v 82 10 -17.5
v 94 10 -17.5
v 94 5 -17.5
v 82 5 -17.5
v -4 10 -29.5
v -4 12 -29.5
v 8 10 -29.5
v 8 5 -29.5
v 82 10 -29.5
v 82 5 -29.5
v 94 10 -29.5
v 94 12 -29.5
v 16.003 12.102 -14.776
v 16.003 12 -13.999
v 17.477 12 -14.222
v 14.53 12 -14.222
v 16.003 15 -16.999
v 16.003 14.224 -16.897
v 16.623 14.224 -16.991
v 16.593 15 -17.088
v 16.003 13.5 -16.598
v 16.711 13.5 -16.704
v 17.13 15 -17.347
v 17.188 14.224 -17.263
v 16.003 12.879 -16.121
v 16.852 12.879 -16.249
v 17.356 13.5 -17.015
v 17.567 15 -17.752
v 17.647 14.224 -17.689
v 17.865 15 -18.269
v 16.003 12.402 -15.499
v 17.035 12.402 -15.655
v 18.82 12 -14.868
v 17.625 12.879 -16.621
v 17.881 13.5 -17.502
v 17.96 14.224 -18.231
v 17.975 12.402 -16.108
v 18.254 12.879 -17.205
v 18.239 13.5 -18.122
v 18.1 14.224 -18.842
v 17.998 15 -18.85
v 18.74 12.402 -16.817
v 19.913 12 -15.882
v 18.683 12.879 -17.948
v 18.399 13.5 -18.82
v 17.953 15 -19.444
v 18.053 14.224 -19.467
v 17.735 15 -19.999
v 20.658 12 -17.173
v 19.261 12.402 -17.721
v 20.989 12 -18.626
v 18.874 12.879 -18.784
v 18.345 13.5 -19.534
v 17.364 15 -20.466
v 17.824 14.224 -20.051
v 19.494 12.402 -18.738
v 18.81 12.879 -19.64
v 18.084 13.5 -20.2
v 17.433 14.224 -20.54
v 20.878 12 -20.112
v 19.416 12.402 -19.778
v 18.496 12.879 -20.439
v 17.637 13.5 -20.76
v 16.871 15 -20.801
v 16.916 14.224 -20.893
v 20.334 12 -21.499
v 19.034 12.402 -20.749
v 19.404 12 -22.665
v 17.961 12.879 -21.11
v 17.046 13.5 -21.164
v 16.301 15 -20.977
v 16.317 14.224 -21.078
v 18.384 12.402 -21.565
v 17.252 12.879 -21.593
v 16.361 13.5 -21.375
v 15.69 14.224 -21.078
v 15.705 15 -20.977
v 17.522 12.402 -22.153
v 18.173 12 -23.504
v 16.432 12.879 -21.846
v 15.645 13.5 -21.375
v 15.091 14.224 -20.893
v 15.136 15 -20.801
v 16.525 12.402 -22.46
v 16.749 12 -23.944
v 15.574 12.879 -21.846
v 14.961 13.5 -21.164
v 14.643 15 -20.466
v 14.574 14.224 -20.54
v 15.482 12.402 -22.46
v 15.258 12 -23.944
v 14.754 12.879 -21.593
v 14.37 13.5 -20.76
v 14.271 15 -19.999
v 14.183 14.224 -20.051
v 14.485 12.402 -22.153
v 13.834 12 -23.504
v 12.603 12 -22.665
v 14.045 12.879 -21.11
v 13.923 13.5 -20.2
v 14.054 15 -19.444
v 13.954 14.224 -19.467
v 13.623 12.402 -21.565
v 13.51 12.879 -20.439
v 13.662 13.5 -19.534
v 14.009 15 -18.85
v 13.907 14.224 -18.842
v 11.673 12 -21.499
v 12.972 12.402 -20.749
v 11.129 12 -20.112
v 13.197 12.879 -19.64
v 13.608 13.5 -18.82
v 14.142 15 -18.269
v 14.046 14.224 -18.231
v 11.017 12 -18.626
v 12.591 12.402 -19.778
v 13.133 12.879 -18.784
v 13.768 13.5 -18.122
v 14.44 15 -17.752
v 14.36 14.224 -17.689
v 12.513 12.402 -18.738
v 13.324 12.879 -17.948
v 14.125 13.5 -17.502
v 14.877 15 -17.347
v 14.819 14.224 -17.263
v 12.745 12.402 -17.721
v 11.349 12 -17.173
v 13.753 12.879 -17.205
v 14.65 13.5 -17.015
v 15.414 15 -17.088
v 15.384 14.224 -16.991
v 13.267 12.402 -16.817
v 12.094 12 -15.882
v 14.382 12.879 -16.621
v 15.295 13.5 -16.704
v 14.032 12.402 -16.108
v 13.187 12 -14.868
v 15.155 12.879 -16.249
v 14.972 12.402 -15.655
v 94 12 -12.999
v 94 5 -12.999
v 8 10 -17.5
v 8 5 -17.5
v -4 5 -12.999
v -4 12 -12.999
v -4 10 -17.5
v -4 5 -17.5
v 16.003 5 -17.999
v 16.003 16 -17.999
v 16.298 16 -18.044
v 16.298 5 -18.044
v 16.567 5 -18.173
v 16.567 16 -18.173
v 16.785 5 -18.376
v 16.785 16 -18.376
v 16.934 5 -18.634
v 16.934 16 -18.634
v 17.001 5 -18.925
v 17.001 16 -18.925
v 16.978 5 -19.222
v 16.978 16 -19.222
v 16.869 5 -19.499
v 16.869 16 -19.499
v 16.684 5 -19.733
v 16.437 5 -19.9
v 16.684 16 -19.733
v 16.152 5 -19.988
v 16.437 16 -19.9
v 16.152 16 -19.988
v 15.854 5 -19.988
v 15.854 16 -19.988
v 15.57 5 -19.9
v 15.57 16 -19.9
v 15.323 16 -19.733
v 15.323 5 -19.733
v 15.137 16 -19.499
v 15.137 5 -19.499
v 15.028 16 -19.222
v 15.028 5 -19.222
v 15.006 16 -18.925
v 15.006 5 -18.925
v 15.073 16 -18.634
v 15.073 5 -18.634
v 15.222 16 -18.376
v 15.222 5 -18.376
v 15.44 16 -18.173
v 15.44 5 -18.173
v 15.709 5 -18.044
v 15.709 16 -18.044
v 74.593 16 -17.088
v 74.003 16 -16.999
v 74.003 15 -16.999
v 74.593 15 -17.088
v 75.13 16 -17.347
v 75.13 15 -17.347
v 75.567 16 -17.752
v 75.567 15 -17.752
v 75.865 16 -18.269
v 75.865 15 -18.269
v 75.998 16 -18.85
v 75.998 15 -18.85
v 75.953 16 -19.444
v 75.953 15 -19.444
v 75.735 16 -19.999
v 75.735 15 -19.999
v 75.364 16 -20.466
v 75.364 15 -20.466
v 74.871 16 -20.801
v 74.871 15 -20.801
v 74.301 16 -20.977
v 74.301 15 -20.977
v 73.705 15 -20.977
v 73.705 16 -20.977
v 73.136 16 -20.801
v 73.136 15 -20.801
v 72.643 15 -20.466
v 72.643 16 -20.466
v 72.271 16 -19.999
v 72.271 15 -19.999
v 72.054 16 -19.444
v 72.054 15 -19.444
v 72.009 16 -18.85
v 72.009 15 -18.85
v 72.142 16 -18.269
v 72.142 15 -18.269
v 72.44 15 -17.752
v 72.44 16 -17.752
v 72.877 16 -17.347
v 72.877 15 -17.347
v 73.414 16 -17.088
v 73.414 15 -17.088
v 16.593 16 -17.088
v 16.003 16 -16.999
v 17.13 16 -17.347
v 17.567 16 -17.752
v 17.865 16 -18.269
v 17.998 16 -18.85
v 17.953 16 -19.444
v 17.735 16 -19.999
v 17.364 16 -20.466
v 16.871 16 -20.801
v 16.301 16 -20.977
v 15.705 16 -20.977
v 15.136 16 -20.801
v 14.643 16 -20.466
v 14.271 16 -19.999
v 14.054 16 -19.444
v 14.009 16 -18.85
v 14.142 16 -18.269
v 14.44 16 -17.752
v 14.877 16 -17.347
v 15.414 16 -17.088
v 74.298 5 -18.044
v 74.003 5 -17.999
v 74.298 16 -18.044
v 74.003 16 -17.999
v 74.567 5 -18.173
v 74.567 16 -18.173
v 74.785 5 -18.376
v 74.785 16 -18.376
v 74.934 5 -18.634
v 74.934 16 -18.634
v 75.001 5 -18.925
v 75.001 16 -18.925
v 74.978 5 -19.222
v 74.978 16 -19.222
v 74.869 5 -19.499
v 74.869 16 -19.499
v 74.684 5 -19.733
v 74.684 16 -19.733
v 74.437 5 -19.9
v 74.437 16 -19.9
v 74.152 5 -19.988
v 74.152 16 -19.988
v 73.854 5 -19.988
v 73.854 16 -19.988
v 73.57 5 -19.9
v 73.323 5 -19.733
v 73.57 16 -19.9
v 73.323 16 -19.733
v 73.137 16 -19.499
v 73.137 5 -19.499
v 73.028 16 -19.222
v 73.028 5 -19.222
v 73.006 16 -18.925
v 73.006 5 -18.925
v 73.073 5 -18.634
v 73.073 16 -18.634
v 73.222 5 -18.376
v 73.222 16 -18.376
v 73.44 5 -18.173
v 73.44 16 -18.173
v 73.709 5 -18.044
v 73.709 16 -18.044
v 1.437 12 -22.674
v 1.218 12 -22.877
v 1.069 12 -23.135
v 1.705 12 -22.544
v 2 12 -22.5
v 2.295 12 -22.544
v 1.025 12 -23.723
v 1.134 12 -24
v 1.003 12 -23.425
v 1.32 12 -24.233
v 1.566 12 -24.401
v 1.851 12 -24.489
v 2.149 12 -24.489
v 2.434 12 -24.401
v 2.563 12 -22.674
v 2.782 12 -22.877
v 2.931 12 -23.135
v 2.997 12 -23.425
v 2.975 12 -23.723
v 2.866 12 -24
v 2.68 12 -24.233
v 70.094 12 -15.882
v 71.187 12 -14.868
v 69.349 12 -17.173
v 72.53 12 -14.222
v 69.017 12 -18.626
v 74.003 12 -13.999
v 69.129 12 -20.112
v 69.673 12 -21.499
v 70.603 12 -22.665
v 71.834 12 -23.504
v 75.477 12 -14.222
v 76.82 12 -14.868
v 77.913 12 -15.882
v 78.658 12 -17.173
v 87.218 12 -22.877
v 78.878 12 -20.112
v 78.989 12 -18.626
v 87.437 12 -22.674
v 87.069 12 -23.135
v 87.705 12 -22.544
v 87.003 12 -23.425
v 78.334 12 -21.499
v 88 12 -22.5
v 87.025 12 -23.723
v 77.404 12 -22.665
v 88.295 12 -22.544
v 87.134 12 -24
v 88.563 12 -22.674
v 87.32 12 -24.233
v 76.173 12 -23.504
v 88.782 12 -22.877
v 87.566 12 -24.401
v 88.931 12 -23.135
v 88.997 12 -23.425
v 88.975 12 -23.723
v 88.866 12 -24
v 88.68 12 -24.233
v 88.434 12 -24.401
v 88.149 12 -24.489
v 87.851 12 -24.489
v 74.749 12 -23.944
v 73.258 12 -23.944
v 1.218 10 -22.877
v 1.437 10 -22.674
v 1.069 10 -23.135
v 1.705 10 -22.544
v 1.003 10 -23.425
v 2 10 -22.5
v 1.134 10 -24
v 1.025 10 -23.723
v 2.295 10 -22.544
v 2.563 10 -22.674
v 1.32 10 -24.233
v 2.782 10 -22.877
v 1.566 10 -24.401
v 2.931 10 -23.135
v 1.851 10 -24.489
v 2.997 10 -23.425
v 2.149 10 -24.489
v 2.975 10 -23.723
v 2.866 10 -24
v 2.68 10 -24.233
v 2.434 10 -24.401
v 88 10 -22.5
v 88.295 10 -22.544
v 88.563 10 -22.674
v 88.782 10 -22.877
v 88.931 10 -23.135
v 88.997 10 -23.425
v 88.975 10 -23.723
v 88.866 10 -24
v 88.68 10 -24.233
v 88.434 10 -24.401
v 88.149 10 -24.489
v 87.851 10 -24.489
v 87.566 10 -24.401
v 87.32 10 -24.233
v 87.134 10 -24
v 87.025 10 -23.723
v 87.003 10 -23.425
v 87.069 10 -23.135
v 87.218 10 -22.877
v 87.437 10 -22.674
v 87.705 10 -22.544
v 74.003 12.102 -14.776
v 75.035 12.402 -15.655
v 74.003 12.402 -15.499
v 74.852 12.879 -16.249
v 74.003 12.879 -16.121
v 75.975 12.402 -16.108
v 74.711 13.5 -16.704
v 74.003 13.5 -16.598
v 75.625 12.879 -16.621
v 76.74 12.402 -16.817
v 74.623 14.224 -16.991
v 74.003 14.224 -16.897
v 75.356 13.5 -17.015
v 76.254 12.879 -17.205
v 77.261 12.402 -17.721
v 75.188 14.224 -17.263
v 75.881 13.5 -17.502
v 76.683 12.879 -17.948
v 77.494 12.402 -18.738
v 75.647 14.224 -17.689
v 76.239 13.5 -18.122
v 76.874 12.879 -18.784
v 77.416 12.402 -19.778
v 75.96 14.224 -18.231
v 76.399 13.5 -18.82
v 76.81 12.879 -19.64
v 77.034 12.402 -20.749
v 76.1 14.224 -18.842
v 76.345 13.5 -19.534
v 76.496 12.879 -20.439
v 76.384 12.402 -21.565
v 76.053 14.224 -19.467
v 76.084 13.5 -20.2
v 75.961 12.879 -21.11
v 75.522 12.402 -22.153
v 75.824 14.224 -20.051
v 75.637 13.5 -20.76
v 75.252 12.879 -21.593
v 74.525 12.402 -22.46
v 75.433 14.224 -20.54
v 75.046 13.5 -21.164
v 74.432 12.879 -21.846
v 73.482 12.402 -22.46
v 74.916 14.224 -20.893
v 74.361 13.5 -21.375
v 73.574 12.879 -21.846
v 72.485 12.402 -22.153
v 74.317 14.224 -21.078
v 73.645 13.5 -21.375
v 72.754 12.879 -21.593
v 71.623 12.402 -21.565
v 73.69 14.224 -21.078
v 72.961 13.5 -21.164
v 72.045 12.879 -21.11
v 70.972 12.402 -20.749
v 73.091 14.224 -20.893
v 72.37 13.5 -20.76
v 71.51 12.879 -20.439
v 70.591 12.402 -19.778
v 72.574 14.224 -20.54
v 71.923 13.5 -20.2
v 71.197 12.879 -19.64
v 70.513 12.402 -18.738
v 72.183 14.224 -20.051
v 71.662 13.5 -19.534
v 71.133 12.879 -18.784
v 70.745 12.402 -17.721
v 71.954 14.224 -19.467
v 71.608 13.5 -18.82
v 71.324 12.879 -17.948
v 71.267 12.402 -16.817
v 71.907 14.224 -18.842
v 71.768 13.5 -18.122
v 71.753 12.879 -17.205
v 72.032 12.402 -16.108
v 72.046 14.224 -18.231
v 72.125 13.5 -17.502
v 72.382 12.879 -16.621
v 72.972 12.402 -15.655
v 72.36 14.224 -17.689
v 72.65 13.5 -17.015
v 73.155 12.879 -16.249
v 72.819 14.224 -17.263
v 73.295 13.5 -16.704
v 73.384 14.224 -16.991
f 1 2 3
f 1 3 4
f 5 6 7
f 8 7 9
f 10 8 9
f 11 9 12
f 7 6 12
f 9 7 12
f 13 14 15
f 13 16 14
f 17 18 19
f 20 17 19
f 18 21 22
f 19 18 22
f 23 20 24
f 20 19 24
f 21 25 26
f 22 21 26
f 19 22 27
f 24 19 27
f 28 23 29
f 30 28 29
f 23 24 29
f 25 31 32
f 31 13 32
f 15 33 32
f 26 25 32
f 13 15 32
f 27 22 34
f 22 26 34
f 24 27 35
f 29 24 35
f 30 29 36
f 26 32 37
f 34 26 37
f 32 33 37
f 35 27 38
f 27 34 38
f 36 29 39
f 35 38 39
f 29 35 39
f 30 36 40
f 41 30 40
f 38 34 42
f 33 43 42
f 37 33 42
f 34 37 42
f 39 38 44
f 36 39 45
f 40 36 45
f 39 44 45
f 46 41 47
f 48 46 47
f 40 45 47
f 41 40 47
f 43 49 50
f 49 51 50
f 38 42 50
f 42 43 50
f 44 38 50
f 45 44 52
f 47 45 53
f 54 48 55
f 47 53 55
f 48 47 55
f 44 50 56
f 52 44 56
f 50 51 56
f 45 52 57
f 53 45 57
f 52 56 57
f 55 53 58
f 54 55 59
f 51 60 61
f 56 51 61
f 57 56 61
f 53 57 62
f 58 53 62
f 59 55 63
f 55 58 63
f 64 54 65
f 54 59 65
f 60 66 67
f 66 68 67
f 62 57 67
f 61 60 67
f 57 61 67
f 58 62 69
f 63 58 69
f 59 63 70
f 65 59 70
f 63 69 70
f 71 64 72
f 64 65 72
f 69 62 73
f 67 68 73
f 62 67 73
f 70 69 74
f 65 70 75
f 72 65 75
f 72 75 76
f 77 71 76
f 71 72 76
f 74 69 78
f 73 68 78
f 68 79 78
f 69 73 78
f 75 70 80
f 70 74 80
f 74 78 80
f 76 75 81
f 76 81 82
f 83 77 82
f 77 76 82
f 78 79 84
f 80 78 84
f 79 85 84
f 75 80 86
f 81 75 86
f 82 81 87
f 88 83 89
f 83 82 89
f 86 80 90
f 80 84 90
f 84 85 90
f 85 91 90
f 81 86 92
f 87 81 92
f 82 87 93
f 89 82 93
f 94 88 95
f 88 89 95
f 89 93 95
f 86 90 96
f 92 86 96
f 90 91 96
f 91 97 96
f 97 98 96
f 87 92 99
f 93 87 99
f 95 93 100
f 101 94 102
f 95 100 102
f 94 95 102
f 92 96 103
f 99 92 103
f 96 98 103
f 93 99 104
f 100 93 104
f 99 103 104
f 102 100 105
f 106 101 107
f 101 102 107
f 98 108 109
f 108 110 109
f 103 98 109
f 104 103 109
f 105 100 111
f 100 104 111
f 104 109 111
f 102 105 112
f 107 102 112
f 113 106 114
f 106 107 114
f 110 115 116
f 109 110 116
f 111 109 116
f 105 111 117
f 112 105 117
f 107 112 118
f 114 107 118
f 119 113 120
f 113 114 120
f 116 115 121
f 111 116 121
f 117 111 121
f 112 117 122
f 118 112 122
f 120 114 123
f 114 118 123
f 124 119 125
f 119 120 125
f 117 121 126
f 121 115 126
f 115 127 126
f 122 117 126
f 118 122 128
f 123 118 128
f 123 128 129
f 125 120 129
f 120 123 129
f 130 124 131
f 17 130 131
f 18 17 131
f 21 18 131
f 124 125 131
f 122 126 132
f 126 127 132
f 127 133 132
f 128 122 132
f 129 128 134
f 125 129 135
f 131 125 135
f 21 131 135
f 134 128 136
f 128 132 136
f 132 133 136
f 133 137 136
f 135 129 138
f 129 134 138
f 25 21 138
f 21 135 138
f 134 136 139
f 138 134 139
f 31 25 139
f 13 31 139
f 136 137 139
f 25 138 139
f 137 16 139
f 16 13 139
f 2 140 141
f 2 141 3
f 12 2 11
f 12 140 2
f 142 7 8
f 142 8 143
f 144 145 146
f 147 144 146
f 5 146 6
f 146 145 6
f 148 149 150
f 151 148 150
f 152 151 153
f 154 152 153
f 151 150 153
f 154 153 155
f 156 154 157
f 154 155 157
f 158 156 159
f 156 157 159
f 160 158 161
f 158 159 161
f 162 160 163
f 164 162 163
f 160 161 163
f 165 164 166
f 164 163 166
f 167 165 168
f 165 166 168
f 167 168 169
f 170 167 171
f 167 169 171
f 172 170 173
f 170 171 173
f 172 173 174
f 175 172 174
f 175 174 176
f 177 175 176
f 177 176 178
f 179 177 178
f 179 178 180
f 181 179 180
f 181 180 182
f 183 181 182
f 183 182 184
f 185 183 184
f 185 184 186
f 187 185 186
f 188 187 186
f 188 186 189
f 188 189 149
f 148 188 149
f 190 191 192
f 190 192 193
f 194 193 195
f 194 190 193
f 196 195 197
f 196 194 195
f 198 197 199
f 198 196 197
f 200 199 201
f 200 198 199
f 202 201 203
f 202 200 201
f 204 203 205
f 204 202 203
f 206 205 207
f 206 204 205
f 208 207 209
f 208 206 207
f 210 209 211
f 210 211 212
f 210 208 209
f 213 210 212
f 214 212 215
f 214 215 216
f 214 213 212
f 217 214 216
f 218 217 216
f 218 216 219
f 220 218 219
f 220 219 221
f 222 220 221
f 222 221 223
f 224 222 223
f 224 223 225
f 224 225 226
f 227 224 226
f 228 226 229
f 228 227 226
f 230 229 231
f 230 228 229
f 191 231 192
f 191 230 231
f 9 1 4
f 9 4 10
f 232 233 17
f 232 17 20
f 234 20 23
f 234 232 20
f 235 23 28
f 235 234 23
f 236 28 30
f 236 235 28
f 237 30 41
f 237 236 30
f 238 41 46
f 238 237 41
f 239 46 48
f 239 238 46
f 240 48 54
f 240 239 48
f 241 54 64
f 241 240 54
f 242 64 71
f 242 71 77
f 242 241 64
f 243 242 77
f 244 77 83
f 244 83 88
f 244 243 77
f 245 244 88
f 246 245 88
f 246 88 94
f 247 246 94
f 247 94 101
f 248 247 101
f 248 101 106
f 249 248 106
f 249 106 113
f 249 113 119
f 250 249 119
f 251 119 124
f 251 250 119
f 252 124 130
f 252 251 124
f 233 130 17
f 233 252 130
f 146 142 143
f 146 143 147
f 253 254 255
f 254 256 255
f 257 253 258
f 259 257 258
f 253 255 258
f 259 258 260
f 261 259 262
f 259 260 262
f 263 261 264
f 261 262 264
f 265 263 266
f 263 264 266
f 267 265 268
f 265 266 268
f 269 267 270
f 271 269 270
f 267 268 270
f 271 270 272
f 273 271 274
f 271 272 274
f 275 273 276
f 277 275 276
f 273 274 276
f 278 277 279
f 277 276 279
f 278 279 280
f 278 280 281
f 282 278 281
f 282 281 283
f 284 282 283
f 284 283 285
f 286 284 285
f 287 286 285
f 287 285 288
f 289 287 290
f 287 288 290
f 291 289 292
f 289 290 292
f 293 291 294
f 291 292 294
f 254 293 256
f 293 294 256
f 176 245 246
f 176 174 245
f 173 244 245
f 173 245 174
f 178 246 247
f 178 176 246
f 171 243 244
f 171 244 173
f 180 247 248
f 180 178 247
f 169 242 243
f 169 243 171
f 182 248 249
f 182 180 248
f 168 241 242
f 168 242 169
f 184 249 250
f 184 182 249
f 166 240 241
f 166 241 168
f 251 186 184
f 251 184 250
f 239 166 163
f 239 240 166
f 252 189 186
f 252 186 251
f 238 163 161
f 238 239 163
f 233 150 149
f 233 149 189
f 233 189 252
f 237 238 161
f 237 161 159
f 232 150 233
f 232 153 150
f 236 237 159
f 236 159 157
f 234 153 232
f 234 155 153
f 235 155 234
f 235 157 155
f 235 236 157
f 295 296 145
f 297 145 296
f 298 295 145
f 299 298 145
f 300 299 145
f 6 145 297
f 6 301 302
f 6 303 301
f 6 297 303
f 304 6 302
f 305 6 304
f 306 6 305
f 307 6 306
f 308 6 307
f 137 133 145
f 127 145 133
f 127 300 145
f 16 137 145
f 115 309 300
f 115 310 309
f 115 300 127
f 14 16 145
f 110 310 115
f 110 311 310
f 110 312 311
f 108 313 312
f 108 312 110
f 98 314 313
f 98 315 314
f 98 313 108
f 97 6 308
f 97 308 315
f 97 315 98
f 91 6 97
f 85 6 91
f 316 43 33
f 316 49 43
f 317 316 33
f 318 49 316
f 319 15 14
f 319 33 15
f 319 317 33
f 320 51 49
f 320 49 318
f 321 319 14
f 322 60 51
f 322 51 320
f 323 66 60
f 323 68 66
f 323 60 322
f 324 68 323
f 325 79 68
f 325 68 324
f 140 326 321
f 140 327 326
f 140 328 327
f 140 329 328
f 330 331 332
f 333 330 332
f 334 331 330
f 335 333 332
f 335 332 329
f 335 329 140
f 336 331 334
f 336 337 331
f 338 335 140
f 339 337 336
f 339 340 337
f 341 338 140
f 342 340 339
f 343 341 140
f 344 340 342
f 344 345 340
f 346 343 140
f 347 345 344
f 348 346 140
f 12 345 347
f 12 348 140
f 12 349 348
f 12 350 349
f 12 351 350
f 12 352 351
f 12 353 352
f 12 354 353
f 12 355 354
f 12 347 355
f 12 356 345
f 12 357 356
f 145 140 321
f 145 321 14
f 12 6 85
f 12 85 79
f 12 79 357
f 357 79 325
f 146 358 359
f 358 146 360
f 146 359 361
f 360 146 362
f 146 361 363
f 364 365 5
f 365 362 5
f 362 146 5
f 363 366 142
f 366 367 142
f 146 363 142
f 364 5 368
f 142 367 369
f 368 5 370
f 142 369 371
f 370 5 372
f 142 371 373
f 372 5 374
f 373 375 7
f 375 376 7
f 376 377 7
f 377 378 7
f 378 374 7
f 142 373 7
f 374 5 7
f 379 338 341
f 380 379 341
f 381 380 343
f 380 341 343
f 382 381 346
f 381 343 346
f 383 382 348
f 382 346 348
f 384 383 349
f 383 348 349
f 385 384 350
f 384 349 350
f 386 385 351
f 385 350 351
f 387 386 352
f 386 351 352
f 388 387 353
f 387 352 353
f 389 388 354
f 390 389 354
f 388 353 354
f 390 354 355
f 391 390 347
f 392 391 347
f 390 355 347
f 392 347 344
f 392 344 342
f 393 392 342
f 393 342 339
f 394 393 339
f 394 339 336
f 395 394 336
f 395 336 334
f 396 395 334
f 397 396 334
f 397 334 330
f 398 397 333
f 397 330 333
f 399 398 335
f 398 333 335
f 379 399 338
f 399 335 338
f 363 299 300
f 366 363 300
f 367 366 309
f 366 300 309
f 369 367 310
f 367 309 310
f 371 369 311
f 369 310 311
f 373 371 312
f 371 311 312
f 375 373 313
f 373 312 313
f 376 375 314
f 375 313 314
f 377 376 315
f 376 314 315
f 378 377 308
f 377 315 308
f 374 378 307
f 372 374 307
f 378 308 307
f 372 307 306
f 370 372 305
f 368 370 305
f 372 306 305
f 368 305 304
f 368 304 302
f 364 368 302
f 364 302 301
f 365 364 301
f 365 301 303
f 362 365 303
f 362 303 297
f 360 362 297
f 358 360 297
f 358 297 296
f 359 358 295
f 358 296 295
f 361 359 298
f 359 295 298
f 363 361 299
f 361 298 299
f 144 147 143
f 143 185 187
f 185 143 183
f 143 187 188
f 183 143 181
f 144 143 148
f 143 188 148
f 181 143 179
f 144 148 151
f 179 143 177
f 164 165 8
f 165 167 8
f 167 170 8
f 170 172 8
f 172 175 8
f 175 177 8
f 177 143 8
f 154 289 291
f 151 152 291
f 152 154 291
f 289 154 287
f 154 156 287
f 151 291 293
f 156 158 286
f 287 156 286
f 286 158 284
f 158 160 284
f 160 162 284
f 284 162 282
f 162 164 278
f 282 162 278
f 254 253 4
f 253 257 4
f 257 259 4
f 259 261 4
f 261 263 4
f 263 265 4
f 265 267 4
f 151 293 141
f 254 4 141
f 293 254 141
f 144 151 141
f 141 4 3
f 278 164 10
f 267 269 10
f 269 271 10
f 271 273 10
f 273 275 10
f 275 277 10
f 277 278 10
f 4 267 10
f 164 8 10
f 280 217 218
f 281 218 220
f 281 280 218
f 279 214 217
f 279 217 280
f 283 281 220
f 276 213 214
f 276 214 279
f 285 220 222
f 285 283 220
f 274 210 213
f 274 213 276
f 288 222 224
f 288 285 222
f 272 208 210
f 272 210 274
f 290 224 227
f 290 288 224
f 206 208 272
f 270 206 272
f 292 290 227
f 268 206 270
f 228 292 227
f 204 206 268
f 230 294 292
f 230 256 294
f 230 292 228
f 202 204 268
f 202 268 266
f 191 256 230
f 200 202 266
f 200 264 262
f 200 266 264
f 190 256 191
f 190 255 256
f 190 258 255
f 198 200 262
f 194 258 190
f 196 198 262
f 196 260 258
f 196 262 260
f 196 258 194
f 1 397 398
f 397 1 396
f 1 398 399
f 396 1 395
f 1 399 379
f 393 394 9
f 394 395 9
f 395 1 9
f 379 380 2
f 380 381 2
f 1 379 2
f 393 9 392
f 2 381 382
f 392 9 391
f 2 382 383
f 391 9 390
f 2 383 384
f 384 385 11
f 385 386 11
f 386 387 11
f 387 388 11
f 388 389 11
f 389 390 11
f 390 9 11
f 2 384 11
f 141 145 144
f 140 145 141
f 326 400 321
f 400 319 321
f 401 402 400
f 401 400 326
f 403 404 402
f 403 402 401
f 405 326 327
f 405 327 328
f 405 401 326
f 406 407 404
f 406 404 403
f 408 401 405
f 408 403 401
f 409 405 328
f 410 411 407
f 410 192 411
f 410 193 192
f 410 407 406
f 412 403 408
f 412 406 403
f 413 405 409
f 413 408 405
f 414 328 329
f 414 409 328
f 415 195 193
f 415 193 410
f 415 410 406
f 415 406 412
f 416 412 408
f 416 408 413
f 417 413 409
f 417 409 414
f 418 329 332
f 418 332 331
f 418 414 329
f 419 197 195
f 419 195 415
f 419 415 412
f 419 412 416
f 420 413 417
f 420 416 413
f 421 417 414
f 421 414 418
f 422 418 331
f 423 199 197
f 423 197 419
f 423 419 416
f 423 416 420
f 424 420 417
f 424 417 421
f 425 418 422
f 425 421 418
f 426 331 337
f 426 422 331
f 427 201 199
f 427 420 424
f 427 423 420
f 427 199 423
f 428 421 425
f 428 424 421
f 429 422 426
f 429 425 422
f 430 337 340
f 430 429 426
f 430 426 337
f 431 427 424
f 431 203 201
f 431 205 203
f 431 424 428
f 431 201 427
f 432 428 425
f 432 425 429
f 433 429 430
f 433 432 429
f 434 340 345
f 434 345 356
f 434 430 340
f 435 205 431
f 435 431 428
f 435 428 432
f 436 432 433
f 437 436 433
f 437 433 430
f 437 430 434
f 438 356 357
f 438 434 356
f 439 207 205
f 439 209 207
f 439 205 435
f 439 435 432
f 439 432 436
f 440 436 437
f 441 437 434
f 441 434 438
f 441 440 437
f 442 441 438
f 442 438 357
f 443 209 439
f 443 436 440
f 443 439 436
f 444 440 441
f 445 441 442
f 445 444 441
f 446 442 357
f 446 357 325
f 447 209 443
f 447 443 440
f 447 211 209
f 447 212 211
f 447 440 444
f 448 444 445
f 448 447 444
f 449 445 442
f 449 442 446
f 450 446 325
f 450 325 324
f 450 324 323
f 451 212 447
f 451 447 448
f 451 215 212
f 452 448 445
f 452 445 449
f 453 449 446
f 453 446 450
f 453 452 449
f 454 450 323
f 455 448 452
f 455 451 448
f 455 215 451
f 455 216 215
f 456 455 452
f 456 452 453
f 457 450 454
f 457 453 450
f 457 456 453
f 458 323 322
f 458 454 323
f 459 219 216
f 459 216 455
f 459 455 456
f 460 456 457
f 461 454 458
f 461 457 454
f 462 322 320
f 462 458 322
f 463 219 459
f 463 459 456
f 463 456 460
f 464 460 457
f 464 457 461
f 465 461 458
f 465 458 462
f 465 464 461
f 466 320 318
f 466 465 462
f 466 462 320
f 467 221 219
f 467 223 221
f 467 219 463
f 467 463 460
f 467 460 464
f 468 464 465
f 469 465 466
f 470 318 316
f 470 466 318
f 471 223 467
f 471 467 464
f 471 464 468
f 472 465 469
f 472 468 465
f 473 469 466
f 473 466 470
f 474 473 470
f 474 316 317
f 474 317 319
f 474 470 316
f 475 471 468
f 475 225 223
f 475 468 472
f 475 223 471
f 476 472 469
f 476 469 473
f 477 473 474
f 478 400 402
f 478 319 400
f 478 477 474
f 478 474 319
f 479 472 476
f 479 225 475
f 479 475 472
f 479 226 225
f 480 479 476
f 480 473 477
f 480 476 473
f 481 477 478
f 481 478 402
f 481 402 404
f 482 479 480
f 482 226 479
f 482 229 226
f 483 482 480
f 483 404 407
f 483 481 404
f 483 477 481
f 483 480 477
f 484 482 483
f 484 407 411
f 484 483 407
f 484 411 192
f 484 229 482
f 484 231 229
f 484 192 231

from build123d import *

# Parameters (mm, degrees)
SKETCH_10_R     = 1
EXTRUDE_5_DEPTH = 5
EXTRUDE_START   = 2
SKETCH_10_4_W   = 97.99999928
SKETCH_10_4_H   = 16.500549096
SKETCH_10_4_R   = 1
EXTRUDE_6_DEPTH = 2
EXTRUDE_START_2 = 4
SKETCH_11_R     = 2
SKETCH_11_R_2   = 1
EXTRUDE_8_DEPTH = 4
FILLET_30_R     = 3


with BuildPart() as part:
    # 草图10 → 凸台-拉伸5 (new body)
    with BuildSketch(Plane(origin=(0, 10, 0), x_dir=(1, 0, 0), z_dir=(0, 1, 0))):
        Polygon((8.00000036, 17.5), (-3.99999964, 17.5), (-3.99999964, 12.999450904), (93.99999964, 12.999450904), (93.99999964, 17.5), (81.99999964, 17.5), (81.99999964, 29.5), (8.00000036, 29.5), align=None)
        with Locations((16.003399367, 18.999450904)):
            Circle(SKETCH_10_R, mode=Mode.SUBTRACT)
        with Locations((74.003399367, 18.999450904)):
            Circle(SKETCH_10_R, mode=Mode.SUBTRACT)
    extrude(amount=-EXTRUDE_5_DEPTH)

    # 草图10<4> → 凸台-拉伸6 (add)
    with BuildSketch(Plane(origin=(0, 10, 0), x_dir=(1, 0, 0), z_dir=(0, 1, 0)).offset(EXTRUDE_START)):
        with Locations((45, 21.249725452)):
            Rectangle(SKETCH_10_4_W, SKETCH_10_4_H)
        with Locations((2.00000036, 23.5)):
            Circle(SKETCH_10_4_R, mode=Mode.SUBTRACT)
        with Locations((88.00000036, 23.5)):
            Circle(SKETCH_10_4_R, mode=Mode.SUBTRACT)
        with Locations((16.003399367, 18.999450904)):
            Circle(SKETCH_10_4_R, mode=Mode.SUBTRACT)
        with Locations((74.003399367, 18.999450904)):
            Circle(SKETCH_10_4_R, mode=Mode.SUBTRACT)
    extrude(amount=-EXTRUDE_6_DEPTH)

    # 草图11 → 凸台-拉伸8 (add)
    # profile 1 of 2: a face of its own
    with BuildSketch(Plane(origin=(0, 12, 0), x_dir=(1, 0, 0), z_dir=(0, 1, 0)).offset(EXTRUDE_START_2)):
        with Locations((16.003399367, 18.999450904)):
            Circle(SKETCH_11_R)
        with Locations((16.003399367, 18.999450904)):
            Circle(SKETCH_11_R_2, mode=Mode.SUBTRACT)
    # profile 2 of 2: a face of its own
    with BuildSketch(Plane(origin=(0, 12, 0), x_dir=(1, 0, 0), z_dir=(0, 1, 0)).offset(EXTRUDE_START_2)):
        with Locations((74.003399367, 18.999450904)):
            Circle(SKETCH_11_R)
        with Locations((74.003399367, 18.999450904)):
            Circle(SKETCH_11_R_2, mode=Mode.SUBTRACT)
    extrude(amount=-EXTRUDE_8_DEPTH)

    # 圆角30
    fillet_30_edges = [part.edges().sort_by_distance(p)[0] for p in [
        (14.003399367, 12, -18.999450904),
        (72.003399367, 12, -18.999450904),
    ]]
    fillet(fillet_30_edges, radius=FILLET_30_R)


solid = part.part
